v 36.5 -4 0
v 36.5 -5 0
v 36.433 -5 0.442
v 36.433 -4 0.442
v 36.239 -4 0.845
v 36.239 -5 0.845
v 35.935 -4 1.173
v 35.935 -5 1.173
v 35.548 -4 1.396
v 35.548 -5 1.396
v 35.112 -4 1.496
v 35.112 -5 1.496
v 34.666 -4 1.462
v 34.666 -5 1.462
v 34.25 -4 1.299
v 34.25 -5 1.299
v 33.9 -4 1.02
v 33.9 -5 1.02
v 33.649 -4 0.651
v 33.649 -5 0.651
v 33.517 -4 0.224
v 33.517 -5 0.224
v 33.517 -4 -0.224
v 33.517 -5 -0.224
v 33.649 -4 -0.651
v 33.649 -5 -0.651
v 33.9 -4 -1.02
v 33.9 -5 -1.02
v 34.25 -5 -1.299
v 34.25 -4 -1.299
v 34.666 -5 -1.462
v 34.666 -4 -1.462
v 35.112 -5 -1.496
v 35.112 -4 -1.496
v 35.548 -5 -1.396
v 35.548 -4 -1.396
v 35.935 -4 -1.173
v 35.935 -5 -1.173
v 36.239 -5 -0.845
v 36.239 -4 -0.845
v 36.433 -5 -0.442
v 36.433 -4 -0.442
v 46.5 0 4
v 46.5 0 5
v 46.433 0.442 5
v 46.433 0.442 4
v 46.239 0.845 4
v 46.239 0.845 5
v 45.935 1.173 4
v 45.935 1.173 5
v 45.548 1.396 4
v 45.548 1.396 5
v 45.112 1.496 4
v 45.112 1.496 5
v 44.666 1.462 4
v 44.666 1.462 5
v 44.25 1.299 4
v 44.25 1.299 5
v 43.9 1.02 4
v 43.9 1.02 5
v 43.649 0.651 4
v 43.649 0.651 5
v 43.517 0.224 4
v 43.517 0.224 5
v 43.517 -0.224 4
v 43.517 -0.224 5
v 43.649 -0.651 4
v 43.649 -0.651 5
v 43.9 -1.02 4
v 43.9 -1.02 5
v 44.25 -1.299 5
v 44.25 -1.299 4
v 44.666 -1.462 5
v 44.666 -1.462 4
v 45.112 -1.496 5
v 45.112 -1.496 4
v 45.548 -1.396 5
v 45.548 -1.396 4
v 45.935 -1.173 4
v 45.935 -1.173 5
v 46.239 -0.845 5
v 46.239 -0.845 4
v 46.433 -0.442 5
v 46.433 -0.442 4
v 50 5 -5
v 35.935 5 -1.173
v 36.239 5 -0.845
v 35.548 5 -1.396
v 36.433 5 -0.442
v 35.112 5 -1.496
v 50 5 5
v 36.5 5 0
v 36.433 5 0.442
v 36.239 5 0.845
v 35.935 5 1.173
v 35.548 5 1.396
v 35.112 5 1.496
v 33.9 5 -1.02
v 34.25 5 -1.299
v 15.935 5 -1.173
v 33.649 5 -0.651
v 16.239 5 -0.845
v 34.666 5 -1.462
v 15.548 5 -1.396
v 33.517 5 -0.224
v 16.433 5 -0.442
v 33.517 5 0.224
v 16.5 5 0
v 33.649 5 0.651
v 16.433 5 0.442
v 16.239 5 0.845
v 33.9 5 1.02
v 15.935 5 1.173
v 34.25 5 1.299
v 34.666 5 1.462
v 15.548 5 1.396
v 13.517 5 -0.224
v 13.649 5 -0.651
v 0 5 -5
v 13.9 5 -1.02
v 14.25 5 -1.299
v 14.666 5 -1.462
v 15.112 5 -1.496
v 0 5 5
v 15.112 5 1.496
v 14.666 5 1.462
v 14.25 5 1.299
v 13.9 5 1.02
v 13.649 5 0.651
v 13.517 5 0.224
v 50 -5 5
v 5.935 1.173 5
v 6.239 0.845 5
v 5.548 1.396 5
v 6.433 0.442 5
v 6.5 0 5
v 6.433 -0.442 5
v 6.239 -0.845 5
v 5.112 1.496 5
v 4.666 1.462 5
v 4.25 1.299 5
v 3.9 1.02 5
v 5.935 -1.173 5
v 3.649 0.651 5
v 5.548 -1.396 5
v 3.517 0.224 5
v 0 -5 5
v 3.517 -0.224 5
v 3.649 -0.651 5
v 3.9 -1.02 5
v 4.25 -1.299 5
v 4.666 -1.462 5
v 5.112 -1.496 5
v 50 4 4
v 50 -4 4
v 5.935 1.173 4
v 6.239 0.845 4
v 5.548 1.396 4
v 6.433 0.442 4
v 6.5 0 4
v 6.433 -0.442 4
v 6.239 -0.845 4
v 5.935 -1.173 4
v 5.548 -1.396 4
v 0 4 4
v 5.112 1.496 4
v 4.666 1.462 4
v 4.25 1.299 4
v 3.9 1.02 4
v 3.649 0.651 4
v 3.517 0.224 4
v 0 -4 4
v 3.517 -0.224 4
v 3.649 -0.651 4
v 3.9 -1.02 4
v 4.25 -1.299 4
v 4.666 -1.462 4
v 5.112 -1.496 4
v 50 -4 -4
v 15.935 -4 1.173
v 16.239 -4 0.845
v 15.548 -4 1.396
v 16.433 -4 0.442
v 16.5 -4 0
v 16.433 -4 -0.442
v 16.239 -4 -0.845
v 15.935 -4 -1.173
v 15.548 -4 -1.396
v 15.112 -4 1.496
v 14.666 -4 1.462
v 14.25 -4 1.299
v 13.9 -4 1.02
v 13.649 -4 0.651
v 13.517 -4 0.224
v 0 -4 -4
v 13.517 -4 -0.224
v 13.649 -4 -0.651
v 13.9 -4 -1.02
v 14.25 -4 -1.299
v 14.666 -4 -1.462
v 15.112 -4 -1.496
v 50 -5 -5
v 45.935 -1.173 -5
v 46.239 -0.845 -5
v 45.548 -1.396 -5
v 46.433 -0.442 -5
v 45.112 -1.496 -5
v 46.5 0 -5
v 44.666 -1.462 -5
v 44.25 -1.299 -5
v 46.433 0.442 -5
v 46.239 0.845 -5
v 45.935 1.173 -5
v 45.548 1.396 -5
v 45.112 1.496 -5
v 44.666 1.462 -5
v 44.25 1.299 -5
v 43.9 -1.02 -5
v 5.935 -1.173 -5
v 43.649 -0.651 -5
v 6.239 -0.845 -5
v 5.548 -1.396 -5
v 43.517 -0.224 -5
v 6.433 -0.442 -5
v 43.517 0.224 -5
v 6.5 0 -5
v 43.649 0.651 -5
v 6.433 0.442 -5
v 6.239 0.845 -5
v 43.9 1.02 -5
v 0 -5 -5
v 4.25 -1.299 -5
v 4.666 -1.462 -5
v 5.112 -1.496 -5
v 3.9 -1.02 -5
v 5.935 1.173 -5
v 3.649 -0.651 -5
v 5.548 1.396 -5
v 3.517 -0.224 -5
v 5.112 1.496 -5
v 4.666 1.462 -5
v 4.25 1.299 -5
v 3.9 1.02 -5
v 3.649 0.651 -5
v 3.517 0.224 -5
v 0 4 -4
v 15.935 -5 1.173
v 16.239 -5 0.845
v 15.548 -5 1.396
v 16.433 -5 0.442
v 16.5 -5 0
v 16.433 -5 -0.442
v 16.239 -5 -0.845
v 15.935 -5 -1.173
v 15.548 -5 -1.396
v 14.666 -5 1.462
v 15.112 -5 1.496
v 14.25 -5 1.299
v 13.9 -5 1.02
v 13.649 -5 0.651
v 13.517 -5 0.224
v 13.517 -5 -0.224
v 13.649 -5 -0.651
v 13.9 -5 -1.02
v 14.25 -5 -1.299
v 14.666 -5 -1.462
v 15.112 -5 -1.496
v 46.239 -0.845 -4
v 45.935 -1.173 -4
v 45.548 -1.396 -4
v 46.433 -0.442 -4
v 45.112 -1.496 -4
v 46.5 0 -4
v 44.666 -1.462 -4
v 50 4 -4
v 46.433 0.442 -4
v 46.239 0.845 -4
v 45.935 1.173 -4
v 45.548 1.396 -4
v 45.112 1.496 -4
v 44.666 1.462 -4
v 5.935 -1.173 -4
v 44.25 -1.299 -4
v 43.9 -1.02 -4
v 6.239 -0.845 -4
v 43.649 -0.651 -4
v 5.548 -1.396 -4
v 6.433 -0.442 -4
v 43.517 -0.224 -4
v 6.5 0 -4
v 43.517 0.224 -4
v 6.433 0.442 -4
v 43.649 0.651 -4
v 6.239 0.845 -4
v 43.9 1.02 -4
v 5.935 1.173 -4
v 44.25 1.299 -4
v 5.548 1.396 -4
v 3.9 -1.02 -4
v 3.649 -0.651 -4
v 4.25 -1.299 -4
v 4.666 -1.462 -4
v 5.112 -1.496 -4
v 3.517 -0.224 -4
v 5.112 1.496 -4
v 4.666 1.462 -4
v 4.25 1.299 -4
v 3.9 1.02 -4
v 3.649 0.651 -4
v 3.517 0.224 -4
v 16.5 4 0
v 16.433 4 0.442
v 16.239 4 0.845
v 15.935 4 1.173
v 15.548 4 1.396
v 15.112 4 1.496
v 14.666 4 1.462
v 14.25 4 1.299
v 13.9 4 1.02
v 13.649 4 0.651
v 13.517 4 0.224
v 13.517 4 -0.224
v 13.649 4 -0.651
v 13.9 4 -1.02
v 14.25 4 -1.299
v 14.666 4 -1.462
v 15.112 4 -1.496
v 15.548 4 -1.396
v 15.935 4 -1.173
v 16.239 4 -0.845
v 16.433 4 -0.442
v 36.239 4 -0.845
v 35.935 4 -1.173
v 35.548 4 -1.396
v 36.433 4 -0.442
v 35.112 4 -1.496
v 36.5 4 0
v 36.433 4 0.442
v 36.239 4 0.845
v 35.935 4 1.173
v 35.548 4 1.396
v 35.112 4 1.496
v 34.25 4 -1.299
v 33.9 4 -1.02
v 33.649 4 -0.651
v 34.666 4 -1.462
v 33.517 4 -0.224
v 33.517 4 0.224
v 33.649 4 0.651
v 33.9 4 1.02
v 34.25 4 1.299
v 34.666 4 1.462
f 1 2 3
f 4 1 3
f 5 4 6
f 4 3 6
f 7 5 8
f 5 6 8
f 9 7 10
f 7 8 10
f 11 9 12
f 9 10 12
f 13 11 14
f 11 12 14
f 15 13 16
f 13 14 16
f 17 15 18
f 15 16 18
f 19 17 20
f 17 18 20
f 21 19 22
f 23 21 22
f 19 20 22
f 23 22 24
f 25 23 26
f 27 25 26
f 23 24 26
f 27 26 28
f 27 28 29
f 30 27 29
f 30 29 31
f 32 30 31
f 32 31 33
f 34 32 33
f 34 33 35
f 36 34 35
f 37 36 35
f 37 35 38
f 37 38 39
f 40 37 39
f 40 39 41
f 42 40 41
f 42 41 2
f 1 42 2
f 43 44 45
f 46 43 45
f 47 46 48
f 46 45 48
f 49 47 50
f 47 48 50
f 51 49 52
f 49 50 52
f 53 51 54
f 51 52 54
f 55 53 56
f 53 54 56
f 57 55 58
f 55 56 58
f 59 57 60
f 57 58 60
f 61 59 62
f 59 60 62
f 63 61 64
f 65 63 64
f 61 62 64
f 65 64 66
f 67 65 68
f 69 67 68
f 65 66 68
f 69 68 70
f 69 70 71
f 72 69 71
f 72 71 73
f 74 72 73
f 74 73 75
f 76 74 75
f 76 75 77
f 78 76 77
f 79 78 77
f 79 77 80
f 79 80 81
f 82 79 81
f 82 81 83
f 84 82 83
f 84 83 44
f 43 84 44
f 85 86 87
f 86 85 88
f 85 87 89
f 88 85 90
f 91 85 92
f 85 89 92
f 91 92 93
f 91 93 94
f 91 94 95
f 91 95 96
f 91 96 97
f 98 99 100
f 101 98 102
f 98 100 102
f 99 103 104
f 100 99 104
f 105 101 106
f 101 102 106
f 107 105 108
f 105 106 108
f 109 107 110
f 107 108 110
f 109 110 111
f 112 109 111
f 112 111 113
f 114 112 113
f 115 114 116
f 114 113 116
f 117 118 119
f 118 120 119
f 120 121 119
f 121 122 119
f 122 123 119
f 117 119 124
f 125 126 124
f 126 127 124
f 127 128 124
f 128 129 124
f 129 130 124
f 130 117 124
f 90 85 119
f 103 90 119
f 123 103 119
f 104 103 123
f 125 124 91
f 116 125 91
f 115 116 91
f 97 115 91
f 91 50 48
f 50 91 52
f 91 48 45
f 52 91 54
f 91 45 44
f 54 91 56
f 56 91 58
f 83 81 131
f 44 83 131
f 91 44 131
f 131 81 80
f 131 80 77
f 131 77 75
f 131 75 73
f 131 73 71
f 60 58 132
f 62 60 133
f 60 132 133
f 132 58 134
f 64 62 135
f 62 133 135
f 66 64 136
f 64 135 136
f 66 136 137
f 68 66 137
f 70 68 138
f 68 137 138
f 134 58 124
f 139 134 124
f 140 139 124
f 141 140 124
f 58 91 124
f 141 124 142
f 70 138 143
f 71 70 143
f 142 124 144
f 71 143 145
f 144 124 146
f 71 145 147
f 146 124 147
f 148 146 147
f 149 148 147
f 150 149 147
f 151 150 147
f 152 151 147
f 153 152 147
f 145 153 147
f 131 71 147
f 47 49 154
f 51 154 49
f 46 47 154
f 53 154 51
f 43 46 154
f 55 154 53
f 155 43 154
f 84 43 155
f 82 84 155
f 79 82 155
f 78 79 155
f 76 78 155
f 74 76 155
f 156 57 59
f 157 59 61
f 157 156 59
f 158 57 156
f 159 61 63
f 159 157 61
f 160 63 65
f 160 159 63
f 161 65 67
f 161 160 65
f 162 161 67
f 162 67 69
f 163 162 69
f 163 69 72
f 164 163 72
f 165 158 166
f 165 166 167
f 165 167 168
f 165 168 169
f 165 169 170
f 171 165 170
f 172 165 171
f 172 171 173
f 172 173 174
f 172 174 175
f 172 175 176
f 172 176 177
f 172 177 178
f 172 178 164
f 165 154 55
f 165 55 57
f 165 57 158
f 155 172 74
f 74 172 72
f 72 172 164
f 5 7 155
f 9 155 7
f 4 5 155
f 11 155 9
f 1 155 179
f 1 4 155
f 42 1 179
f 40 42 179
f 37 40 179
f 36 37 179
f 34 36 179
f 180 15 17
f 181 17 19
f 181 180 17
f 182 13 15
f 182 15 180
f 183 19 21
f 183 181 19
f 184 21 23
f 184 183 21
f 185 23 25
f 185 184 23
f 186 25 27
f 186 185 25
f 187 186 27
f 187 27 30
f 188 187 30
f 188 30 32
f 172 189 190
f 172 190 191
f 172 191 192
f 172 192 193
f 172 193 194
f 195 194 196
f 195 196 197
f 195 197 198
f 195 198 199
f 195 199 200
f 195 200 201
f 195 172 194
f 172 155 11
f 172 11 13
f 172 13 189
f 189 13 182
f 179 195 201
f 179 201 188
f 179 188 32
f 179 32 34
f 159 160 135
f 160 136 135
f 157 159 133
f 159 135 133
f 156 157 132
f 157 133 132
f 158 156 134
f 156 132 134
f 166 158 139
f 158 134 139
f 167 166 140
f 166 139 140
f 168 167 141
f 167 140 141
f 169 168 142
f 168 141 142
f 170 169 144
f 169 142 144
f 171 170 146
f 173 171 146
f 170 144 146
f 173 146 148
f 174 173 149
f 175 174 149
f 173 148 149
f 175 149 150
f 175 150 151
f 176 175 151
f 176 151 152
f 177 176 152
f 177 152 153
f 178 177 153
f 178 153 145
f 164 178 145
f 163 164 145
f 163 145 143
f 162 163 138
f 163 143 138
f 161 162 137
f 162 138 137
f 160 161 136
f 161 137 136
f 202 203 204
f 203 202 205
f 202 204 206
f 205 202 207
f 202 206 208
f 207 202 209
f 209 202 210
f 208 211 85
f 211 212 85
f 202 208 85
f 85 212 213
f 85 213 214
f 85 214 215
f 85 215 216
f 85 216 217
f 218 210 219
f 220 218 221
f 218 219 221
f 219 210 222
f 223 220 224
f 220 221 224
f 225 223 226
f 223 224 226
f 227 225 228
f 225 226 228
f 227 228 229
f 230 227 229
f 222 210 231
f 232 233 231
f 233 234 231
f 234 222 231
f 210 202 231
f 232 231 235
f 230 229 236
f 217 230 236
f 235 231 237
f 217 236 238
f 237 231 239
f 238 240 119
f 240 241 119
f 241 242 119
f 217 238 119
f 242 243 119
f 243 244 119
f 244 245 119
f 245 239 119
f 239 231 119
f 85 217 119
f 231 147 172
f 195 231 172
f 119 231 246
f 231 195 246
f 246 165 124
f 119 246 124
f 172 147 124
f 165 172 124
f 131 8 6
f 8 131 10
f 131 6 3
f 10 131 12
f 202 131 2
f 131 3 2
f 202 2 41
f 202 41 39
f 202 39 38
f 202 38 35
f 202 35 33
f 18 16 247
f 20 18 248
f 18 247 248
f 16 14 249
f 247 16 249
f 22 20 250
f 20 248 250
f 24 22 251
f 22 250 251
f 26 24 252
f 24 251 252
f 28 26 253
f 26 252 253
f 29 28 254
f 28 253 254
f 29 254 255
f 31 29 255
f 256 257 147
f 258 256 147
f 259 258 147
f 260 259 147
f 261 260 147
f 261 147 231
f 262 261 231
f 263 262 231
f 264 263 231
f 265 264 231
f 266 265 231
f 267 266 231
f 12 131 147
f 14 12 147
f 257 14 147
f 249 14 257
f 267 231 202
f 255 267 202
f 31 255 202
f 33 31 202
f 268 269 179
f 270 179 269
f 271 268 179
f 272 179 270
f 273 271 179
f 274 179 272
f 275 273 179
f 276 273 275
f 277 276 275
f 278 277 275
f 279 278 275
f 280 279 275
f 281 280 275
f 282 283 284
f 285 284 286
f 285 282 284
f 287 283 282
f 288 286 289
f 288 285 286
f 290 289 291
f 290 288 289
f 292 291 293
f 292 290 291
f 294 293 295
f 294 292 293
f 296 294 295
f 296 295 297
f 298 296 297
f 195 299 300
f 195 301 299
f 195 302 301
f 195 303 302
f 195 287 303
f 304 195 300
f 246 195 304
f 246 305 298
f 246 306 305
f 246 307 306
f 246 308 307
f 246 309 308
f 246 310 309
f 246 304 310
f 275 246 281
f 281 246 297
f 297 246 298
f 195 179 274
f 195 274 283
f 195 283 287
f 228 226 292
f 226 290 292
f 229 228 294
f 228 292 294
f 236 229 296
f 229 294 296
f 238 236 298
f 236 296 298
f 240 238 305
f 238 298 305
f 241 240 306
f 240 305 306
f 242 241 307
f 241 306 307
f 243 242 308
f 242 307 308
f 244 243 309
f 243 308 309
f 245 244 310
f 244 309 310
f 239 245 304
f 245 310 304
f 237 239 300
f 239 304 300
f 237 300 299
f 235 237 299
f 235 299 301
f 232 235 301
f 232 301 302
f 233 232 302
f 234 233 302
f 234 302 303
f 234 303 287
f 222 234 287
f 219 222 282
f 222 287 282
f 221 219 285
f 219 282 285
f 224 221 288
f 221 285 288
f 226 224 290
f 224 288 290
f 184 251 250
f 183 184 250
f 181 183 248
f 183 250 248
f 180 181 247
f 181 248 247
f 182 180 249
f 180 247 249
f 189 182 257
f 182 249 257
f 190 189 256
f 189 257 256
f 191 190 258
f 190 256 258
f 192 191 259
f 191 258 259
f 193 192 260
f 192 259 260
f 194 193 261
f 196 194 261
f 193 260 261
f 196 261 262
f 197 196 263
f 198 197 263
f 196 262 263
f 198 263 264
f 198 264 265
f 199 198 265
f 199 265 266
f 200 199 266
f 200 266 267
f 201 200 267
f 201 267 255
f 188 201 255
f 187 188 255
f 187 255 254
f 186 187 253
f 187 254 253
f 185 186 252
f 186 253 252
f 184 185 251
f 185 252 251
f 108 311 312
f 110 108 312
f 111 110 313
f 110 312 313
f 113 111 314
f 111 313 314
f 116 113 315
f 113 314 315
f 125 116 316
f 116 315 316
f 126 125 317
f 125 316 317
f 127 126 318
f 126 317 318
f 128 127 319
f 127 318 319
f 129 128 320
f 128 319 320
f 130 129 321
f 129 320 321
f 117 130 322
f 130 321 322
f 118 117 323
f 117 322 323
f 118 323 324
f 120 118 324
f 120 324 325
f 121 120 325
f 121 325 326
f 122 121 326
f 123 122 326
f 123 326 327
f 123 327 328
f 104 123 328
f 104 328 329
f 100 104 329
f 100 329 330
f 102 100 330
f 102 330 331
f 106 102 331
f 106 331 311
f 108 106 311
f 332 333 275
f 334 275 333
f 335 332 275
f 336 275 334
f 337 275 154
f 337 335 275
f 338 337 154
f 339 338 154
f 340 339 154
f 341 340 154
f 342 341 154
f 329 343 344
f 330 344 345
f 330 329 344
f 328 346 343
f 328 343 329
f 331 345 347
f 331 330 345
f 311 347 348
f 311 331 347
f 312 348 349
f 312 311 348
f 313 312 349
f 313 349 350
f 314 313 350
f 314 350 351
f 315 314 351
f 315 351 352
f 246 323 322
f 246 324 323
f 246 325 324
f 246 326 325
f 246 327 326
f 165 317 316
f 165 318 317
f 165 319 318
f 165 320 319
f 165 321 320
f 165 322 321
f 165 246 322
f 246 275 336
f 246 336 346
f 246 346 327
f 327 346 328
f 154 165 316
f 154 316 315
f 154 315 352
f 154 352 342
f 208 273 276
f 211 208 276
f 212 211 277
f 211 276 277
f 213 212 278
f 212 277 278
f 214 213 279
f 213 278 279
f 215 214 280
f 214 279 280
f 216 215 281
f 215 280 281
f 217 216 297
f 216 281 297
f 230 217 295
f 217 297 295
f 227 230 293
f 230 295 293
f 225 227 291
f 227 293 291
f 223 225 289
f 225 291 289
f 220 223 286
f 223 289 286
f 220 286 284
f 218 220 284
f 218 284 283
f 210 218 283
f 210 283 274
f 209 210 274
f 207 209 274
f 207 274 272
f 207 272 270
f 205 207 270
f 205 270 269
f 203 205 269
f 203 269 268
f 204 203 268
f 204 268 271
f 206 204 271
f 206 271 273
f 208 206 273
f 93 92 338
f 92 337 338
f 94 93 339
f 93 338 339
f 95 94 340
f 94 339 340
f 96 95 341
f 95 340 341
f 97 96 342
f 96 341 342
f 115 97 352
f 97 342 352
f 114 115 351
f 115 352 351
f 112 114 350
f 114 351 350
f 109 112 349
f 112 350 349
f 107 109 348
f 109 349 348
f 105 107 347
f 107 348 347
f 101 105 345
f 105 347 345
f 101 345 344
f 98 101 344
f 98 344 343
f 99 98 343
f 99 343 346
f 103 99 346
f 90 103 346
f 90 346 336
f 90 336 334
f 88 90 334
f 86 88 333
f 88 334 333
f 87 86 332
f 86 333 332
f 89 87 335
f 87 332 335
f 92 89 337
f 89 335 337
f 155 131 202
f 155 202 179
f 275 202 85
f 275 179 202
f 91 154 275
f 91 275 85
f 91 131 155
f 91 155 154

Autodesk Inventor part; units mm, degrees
ref_plane "YZ Plane" through (0, 0, 0) normal (1, 0, 0) x (0, 1, 0)
ref_plane "XZ Plane" through (0, 0, 0) normal (0, 1, 0) x (-1, 0, 0)
ref_plane "XY Plane" through (0, 0, 0) normal (0, 0, 1) x (1, 0, 0)
sketch "スケッチ1" plane through (0, 0, 0) normal (1, 0, 0) x (0, 1, 0)
  line L0 (5, 5) -> (-5, 5)
  line L1 (-5, 5) -> (-5, -5)
  line L2 (-5, -5) -> (5, -5)
  line L3 (5, -5) -> (5, 5)
  line L4 (4, 4) -> (-4, 4)
  line L5 (-4, 4) -> (-4, -4)
  line L6 (-4, -4) -> (4, -4)
  line L7 (4, -4) -> (4, 4)
  point P0 (0, 0)
  dimension "d0" = 1
  dimension "d1" = 1
  dimension "d2" = 1
  dimension "d3" = 1
  dimension "d4" = 10
  dimension "d5" = 10
  dimension "d6" = 5
  dimension "d7" = 5
extrude "押し出し1" add sketch "スケッチ1" along normal blind 50
sketch "スケッチ2" plane through (0, -5, 5) normal (0, 0, 1) x (1, 0, 0)
  circle A0 centre (5, 5) radius 1.5
  line L0 (0, 10) -> (0, 0) projected
  line L1 (0, 0) -> (50, 0) projected
  circle A1 centre (45, 5) radius 1.5
  line L2 (50, 10) -> (50, 0) projected
  point P0 (0, 5)
  dimension "d10" = 3
  dimension "d11" = 5
  dimension "d12" = 5
  dimension "d13" = 5
  dimension "d14" = 5
  dimension "d15" = 3
sketch "スケッチ3" plane through (0, -5, -5) normal (0, -1, 0) x (1, 0, 0)
  circle A0 centre (15, 5) radius 1.5
  line L0 (0, 10) -> (0, 0) projected
  line L1 (0, 10) -> (50, 10) projected
  circle A1 centre (35, 5) radius 1.5
  line L2 (50, 10) -> (50, 0) projected
  line L3 (0, 0) -> (50, 0) projected
  point P0 (0, 5)
  dimension "d16" = 3
  dimension "d17" = 15
  dimension "d18" = 5
  dimension "d19" = 15
  dimension "d20" = 5
  dimension "d21" = 3
extrude "押し出し2" cut sketch "スケッチ2" against normal blind 50
extrude "押し出し3" cut sketch "スケッチ3" against normal blind 50 contours A0 | A1
properties part number "角パーツ" material "アルミニウム 6061"
